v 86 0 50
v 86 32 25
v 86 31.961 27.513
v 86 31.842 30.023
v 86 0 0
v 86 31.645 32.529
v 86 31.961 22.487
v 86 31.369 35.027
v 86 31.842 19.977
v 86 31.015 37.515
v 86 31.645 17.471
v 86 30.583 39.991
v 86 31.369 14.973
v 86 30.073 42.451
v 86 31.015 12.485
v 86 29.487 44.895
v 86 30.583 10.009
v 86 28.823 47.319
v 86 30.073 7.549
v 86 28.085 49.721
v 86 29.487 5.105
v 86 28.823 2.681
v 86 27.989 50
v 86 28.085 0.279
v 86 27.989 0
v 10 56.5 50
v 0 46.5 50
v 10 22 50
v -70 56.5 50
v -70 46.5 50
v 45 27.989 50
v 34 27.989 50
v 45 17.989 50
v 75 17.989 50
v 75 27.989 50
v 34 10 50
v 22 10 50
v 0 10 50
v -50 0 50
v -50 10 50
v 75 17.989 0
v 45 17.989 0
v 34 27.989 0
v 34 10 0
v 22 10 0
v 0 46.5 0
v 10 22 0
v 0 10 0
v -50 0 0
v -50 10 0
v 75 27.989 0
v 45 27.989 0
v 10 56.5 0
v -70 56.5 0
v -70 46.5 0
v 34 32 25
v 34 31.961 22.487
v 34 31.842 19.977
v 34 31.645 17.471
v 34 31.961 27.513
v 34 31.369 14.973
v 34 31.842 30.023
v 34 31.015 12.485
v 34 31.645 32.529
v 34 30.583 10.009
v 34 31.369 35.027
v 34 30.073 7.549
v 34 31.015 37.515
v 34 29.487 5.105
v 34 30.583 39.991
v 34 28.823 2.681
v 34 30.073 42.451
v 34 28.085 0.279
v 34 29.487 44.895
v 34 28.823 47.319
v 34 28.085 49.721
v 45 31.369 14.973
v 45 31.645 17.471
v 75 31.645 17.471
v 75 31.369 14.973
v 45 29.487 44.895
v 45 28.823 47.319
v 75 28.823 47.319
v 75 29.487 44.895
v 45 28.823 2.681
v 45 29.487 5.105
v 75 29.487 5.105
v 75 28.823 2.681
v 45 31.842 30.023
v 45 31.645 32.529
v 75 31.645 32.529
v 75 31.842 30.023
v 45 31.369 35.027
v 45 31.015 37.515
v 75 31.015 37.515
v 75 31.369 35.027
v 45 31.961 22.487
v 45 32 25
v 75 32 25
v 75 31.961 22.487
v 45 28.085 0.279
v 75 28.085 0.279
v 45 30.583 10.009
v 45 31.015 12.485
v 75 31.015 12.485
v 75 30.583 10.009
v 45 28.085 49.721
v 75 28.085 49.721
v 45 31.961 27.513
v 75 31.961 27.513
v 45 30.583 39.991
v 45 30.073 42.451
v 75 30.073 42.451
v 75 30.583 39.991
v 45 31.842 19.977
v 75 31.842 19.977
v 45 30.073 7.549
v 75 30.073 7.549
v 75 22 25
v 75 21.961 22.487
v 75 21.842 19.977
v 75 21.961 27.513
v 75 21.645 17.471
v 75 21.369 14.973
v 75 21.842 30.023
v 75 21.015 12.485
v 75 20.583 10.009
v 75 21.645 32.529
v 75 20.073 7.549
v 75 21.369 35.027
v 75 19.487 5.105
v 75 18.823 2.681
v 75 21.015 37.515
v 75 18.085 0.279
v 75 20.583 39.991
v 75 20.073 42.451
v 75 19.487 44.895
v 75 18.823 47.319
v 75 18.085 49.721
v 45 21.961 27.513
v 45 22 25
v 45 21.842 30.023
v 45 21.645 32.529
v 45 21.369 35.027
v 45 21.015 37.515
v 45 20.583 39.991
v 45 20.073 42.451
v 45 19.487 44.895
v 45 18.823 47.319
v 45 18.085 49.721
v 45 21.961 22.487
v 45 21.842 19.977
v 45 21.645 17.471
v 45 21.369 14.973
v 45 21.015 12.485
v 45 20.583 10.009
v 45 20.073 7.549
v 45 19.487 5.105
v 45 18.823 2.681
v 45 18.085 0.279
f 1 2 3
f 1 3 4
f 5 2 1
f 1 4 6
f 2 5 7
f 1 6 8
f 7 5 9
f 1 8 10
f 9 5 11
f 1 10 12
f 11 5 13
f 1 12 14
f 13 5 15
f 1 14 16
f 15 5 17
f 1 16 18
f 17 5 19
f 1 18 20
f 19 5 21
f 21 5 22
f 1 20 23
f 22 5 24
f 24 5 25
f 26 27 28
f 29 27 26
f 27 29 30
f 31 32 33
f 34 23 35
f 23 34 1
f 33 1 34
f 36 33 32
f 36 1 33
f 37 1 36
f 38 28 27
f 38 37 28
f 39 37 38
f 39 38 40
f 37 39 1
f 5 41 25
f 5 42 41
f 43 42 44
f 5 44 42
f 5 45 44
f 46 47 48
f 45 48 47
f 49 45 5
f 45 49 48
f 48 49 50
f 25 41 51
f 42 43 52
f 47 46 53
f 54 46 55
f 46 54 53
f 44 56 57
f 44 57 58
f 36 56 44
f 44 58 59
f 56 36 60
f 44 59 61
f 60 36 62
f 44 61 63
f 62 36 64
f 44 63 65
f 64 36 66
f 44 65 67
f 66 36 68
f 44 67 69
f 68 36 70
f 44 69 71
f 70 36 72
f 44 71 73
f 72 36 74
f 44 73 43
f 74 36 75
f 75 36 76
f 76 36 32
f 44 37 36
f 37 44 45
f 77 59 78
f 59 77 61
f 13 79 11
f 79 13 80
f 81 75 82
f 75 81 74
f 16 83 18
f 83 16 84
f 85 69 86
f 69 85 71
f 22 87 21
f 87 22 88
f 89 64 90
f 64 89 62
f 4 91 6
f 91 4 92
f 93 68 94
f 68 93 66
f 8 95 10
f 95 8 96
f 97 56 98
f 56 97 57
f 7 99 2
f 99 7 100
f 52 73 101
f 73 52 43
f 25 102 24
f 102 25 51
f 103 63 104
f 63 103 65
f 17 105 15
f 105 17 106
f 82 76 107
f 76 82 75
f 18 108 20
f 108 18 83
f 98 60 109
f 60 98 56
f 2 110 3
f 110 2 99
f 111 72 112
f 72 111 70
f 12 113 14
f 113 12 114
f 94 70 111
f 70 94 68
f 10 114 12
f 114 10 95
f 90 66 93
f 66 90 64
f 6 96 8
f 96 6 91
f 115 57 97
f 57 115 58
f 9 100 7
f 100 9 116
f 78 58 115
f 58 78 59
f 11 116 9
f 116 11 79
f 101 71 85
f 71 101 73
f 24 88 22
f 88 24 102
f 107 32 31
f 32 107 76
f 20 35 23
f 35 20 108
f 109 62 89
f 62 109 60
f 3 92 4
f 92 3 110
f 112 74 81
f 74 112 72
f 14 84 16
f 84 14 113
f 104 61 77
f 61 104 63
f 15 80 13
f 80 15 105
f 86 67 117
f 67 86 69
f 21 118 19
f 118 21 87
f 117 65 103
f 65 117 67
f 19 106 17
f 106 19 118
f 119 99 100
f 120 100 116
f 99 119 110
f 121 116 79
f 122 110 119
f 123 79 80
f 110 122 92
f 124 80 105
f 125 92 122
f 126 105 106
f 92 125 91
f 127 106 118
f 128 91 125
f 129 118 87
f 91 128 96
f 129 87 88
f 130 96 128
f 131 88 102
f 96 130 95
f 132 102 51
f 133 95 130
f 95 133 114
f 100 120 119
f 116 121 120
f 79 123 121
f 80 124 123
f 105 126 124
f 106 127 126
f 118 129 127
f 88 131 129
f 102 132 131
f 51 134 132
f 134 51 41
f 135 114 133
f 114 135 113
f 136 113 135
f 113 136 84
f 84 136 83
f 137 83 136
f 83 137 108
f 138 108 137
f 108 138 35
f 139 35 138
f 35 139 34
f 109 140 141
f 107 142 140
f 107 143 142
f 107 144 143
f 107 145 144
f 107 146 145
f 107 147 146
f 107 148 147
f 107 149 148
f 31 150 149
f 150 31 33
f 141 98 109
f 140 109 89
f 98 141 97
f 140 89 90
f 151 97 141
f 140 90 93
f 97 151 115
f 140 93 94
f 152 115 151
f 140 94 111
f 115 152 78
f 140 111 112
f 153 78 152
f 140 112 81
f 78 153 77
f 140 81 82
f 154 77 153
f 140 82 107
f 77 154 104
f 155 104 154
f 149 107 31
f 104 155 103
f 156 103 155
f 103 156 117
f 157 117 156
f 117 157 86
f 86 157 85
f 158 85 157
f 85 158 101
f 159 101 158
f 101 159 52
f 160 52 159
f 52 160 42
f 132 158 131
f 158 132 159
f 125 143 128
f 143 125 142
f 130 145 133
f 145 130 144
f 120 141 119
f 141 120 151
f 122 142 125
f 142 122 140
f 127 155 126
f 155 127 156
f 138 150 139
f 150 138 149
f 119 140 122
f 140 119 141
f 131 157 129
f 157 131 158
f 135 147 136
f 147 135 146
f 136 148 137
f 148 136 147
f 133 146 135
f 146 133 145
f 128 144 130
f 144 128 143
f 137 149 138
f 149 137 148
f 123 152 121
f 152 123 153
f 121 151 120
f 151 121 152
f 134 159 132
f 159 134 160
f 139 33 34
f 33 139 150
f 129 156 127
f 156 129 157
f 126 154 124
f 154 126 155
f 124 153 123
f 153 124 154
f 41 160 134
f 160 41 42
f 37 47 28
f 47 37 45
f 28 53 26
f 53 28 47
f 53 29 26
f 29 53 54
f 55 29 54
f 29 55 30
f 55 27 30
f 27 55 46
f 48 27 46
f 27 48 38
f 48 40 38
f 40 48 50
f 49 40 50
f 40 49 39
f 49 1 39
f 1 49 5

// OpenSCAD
// airpods-max-desk-hook: desk-edge hanger for AirPods Max (384.8 g)
//
// Hooks over a 35mm desktop. Two contoured rails carry the metal headband arms
// so the knit mesh canopy never takes any load - mesh sag is the known failure
// mode on these.
//
// Print it as modelled, lying on its side: the whole C-profile is a vertical
// extrusion, so nothing overhangs and no supports are needed. What reads as
// "up" in use is +Y here; Z is the width along the desk edge.

/* ---- desk ---- */
desk_t       = 35;    // measured desktop thickness
desk_clear   = 1.5;   // slip fit over the edge
top_arm      = 70;    // reach back across the desk top
bot_arm      = 50;    // reach back underneath

/* ---- structure ---- */
arm_t        = 10;    // arm thickness
web_t        = 10;    // web thickness at the desk edge
hook_w       = 50;    // width along the desk edge (= print height)
gusset       = 12;    // 45 deg fillet at the cradle root

/* ---- saddle ---- */
// The hook passes UNDER the headband, so it meets the arch's inner surface:
// the saddle has to be convex for the arch to nest over it. A concave trough
// would touch at a single point and dig in.
cradle_out   = 60;    // saddle centre, measured out from the desk face
cradle_w     = 52;    // total width across both rails
saddle_r     = 80;    // convex radius, matched to the headband arch
saddle_top   = 32;    // height of the saddle crown
block_h      = 34;    // blank the saddle is carved from
relief_w     = 30;    // mesh clearance channel between the rails
relief_d     = 10;    // the knit canopy sags below the metal frame - clear it

eps = 0.01;

slot_h    = desk_t + desk_clear;
top_y0    = arm_t + slot_h;        // underside of the top arm
top_y1    = top_y0 + arm_t;
cradle_x0 = cradle_out - cradle_w / 2;
cradle_x1 = cradle_out + cradle_w / 2;
cz        = hook_w / 2;            // cradle centred across the width

// C-hook and cradle arm, traced as one closed outline.
profile = [
    [-bot_arm,        0],
    [cradle_x1,       0],
    [cradle_x1,       arm_t],
    [web_t + gusset,  arm_t],      // 45 deg gusset into the web
    [web_t,           arm_t + gusset],
    [web_t,           top_y1],
    [-top_arm,        top_y1],
    [-top_arm,        top_y0],
    [0,               top_y0],     // underside of the top arm
    [0,               arm_t],      // back of the desk slot
    [-bot_arm,        arm_t],
];

// A cylinder laid along X: its circular section sits in the YZ plane, which is
// exactly the plane the headband arch curves in.
module arch_cutter(r, cy, x0, len) {
    translate([x0, cy, cz])
        rotate([0, 90, 0])
            cylinder(h = len, r = r, $fn = 200);
}

module saddle_blank() {
    translate([cradle_x0, arm_t, 0])
        cube([cradle_w, block_h - arm_t, hook_w]);
}

module hook() {
    union() {
        linear_extrude(height = hook_w) polygon(profile);

        difference() {
            // Crown the blank into a convex saddle the arch can nest over.
            intersection() {
                saddle_blank();
                arch_cutter(saddle_r, saddle_top - saddle_r,
                            cradle_x0 - eps, cradle_w + 2 * eps);
            }

            // Mesh relief: everything above the same curve dropped by relief_d,
            // limited to the centre band. Leaves two rails carrying the metal
            // frame with the canopy hanging clear between them.
            difference() {
                translate([cradle_out - relief_w / 2, -eps, -eps])
                    cube([relief_w, block_h + 20, hook_w + 2 * eps]);
                arch_cutter(saddle_r, saddle_top - saddle_r - relief_d,
                            cradle_x0 - 2 * eps, cradle_w + 4 * eps);
            }
        }
    }
}

hook();
